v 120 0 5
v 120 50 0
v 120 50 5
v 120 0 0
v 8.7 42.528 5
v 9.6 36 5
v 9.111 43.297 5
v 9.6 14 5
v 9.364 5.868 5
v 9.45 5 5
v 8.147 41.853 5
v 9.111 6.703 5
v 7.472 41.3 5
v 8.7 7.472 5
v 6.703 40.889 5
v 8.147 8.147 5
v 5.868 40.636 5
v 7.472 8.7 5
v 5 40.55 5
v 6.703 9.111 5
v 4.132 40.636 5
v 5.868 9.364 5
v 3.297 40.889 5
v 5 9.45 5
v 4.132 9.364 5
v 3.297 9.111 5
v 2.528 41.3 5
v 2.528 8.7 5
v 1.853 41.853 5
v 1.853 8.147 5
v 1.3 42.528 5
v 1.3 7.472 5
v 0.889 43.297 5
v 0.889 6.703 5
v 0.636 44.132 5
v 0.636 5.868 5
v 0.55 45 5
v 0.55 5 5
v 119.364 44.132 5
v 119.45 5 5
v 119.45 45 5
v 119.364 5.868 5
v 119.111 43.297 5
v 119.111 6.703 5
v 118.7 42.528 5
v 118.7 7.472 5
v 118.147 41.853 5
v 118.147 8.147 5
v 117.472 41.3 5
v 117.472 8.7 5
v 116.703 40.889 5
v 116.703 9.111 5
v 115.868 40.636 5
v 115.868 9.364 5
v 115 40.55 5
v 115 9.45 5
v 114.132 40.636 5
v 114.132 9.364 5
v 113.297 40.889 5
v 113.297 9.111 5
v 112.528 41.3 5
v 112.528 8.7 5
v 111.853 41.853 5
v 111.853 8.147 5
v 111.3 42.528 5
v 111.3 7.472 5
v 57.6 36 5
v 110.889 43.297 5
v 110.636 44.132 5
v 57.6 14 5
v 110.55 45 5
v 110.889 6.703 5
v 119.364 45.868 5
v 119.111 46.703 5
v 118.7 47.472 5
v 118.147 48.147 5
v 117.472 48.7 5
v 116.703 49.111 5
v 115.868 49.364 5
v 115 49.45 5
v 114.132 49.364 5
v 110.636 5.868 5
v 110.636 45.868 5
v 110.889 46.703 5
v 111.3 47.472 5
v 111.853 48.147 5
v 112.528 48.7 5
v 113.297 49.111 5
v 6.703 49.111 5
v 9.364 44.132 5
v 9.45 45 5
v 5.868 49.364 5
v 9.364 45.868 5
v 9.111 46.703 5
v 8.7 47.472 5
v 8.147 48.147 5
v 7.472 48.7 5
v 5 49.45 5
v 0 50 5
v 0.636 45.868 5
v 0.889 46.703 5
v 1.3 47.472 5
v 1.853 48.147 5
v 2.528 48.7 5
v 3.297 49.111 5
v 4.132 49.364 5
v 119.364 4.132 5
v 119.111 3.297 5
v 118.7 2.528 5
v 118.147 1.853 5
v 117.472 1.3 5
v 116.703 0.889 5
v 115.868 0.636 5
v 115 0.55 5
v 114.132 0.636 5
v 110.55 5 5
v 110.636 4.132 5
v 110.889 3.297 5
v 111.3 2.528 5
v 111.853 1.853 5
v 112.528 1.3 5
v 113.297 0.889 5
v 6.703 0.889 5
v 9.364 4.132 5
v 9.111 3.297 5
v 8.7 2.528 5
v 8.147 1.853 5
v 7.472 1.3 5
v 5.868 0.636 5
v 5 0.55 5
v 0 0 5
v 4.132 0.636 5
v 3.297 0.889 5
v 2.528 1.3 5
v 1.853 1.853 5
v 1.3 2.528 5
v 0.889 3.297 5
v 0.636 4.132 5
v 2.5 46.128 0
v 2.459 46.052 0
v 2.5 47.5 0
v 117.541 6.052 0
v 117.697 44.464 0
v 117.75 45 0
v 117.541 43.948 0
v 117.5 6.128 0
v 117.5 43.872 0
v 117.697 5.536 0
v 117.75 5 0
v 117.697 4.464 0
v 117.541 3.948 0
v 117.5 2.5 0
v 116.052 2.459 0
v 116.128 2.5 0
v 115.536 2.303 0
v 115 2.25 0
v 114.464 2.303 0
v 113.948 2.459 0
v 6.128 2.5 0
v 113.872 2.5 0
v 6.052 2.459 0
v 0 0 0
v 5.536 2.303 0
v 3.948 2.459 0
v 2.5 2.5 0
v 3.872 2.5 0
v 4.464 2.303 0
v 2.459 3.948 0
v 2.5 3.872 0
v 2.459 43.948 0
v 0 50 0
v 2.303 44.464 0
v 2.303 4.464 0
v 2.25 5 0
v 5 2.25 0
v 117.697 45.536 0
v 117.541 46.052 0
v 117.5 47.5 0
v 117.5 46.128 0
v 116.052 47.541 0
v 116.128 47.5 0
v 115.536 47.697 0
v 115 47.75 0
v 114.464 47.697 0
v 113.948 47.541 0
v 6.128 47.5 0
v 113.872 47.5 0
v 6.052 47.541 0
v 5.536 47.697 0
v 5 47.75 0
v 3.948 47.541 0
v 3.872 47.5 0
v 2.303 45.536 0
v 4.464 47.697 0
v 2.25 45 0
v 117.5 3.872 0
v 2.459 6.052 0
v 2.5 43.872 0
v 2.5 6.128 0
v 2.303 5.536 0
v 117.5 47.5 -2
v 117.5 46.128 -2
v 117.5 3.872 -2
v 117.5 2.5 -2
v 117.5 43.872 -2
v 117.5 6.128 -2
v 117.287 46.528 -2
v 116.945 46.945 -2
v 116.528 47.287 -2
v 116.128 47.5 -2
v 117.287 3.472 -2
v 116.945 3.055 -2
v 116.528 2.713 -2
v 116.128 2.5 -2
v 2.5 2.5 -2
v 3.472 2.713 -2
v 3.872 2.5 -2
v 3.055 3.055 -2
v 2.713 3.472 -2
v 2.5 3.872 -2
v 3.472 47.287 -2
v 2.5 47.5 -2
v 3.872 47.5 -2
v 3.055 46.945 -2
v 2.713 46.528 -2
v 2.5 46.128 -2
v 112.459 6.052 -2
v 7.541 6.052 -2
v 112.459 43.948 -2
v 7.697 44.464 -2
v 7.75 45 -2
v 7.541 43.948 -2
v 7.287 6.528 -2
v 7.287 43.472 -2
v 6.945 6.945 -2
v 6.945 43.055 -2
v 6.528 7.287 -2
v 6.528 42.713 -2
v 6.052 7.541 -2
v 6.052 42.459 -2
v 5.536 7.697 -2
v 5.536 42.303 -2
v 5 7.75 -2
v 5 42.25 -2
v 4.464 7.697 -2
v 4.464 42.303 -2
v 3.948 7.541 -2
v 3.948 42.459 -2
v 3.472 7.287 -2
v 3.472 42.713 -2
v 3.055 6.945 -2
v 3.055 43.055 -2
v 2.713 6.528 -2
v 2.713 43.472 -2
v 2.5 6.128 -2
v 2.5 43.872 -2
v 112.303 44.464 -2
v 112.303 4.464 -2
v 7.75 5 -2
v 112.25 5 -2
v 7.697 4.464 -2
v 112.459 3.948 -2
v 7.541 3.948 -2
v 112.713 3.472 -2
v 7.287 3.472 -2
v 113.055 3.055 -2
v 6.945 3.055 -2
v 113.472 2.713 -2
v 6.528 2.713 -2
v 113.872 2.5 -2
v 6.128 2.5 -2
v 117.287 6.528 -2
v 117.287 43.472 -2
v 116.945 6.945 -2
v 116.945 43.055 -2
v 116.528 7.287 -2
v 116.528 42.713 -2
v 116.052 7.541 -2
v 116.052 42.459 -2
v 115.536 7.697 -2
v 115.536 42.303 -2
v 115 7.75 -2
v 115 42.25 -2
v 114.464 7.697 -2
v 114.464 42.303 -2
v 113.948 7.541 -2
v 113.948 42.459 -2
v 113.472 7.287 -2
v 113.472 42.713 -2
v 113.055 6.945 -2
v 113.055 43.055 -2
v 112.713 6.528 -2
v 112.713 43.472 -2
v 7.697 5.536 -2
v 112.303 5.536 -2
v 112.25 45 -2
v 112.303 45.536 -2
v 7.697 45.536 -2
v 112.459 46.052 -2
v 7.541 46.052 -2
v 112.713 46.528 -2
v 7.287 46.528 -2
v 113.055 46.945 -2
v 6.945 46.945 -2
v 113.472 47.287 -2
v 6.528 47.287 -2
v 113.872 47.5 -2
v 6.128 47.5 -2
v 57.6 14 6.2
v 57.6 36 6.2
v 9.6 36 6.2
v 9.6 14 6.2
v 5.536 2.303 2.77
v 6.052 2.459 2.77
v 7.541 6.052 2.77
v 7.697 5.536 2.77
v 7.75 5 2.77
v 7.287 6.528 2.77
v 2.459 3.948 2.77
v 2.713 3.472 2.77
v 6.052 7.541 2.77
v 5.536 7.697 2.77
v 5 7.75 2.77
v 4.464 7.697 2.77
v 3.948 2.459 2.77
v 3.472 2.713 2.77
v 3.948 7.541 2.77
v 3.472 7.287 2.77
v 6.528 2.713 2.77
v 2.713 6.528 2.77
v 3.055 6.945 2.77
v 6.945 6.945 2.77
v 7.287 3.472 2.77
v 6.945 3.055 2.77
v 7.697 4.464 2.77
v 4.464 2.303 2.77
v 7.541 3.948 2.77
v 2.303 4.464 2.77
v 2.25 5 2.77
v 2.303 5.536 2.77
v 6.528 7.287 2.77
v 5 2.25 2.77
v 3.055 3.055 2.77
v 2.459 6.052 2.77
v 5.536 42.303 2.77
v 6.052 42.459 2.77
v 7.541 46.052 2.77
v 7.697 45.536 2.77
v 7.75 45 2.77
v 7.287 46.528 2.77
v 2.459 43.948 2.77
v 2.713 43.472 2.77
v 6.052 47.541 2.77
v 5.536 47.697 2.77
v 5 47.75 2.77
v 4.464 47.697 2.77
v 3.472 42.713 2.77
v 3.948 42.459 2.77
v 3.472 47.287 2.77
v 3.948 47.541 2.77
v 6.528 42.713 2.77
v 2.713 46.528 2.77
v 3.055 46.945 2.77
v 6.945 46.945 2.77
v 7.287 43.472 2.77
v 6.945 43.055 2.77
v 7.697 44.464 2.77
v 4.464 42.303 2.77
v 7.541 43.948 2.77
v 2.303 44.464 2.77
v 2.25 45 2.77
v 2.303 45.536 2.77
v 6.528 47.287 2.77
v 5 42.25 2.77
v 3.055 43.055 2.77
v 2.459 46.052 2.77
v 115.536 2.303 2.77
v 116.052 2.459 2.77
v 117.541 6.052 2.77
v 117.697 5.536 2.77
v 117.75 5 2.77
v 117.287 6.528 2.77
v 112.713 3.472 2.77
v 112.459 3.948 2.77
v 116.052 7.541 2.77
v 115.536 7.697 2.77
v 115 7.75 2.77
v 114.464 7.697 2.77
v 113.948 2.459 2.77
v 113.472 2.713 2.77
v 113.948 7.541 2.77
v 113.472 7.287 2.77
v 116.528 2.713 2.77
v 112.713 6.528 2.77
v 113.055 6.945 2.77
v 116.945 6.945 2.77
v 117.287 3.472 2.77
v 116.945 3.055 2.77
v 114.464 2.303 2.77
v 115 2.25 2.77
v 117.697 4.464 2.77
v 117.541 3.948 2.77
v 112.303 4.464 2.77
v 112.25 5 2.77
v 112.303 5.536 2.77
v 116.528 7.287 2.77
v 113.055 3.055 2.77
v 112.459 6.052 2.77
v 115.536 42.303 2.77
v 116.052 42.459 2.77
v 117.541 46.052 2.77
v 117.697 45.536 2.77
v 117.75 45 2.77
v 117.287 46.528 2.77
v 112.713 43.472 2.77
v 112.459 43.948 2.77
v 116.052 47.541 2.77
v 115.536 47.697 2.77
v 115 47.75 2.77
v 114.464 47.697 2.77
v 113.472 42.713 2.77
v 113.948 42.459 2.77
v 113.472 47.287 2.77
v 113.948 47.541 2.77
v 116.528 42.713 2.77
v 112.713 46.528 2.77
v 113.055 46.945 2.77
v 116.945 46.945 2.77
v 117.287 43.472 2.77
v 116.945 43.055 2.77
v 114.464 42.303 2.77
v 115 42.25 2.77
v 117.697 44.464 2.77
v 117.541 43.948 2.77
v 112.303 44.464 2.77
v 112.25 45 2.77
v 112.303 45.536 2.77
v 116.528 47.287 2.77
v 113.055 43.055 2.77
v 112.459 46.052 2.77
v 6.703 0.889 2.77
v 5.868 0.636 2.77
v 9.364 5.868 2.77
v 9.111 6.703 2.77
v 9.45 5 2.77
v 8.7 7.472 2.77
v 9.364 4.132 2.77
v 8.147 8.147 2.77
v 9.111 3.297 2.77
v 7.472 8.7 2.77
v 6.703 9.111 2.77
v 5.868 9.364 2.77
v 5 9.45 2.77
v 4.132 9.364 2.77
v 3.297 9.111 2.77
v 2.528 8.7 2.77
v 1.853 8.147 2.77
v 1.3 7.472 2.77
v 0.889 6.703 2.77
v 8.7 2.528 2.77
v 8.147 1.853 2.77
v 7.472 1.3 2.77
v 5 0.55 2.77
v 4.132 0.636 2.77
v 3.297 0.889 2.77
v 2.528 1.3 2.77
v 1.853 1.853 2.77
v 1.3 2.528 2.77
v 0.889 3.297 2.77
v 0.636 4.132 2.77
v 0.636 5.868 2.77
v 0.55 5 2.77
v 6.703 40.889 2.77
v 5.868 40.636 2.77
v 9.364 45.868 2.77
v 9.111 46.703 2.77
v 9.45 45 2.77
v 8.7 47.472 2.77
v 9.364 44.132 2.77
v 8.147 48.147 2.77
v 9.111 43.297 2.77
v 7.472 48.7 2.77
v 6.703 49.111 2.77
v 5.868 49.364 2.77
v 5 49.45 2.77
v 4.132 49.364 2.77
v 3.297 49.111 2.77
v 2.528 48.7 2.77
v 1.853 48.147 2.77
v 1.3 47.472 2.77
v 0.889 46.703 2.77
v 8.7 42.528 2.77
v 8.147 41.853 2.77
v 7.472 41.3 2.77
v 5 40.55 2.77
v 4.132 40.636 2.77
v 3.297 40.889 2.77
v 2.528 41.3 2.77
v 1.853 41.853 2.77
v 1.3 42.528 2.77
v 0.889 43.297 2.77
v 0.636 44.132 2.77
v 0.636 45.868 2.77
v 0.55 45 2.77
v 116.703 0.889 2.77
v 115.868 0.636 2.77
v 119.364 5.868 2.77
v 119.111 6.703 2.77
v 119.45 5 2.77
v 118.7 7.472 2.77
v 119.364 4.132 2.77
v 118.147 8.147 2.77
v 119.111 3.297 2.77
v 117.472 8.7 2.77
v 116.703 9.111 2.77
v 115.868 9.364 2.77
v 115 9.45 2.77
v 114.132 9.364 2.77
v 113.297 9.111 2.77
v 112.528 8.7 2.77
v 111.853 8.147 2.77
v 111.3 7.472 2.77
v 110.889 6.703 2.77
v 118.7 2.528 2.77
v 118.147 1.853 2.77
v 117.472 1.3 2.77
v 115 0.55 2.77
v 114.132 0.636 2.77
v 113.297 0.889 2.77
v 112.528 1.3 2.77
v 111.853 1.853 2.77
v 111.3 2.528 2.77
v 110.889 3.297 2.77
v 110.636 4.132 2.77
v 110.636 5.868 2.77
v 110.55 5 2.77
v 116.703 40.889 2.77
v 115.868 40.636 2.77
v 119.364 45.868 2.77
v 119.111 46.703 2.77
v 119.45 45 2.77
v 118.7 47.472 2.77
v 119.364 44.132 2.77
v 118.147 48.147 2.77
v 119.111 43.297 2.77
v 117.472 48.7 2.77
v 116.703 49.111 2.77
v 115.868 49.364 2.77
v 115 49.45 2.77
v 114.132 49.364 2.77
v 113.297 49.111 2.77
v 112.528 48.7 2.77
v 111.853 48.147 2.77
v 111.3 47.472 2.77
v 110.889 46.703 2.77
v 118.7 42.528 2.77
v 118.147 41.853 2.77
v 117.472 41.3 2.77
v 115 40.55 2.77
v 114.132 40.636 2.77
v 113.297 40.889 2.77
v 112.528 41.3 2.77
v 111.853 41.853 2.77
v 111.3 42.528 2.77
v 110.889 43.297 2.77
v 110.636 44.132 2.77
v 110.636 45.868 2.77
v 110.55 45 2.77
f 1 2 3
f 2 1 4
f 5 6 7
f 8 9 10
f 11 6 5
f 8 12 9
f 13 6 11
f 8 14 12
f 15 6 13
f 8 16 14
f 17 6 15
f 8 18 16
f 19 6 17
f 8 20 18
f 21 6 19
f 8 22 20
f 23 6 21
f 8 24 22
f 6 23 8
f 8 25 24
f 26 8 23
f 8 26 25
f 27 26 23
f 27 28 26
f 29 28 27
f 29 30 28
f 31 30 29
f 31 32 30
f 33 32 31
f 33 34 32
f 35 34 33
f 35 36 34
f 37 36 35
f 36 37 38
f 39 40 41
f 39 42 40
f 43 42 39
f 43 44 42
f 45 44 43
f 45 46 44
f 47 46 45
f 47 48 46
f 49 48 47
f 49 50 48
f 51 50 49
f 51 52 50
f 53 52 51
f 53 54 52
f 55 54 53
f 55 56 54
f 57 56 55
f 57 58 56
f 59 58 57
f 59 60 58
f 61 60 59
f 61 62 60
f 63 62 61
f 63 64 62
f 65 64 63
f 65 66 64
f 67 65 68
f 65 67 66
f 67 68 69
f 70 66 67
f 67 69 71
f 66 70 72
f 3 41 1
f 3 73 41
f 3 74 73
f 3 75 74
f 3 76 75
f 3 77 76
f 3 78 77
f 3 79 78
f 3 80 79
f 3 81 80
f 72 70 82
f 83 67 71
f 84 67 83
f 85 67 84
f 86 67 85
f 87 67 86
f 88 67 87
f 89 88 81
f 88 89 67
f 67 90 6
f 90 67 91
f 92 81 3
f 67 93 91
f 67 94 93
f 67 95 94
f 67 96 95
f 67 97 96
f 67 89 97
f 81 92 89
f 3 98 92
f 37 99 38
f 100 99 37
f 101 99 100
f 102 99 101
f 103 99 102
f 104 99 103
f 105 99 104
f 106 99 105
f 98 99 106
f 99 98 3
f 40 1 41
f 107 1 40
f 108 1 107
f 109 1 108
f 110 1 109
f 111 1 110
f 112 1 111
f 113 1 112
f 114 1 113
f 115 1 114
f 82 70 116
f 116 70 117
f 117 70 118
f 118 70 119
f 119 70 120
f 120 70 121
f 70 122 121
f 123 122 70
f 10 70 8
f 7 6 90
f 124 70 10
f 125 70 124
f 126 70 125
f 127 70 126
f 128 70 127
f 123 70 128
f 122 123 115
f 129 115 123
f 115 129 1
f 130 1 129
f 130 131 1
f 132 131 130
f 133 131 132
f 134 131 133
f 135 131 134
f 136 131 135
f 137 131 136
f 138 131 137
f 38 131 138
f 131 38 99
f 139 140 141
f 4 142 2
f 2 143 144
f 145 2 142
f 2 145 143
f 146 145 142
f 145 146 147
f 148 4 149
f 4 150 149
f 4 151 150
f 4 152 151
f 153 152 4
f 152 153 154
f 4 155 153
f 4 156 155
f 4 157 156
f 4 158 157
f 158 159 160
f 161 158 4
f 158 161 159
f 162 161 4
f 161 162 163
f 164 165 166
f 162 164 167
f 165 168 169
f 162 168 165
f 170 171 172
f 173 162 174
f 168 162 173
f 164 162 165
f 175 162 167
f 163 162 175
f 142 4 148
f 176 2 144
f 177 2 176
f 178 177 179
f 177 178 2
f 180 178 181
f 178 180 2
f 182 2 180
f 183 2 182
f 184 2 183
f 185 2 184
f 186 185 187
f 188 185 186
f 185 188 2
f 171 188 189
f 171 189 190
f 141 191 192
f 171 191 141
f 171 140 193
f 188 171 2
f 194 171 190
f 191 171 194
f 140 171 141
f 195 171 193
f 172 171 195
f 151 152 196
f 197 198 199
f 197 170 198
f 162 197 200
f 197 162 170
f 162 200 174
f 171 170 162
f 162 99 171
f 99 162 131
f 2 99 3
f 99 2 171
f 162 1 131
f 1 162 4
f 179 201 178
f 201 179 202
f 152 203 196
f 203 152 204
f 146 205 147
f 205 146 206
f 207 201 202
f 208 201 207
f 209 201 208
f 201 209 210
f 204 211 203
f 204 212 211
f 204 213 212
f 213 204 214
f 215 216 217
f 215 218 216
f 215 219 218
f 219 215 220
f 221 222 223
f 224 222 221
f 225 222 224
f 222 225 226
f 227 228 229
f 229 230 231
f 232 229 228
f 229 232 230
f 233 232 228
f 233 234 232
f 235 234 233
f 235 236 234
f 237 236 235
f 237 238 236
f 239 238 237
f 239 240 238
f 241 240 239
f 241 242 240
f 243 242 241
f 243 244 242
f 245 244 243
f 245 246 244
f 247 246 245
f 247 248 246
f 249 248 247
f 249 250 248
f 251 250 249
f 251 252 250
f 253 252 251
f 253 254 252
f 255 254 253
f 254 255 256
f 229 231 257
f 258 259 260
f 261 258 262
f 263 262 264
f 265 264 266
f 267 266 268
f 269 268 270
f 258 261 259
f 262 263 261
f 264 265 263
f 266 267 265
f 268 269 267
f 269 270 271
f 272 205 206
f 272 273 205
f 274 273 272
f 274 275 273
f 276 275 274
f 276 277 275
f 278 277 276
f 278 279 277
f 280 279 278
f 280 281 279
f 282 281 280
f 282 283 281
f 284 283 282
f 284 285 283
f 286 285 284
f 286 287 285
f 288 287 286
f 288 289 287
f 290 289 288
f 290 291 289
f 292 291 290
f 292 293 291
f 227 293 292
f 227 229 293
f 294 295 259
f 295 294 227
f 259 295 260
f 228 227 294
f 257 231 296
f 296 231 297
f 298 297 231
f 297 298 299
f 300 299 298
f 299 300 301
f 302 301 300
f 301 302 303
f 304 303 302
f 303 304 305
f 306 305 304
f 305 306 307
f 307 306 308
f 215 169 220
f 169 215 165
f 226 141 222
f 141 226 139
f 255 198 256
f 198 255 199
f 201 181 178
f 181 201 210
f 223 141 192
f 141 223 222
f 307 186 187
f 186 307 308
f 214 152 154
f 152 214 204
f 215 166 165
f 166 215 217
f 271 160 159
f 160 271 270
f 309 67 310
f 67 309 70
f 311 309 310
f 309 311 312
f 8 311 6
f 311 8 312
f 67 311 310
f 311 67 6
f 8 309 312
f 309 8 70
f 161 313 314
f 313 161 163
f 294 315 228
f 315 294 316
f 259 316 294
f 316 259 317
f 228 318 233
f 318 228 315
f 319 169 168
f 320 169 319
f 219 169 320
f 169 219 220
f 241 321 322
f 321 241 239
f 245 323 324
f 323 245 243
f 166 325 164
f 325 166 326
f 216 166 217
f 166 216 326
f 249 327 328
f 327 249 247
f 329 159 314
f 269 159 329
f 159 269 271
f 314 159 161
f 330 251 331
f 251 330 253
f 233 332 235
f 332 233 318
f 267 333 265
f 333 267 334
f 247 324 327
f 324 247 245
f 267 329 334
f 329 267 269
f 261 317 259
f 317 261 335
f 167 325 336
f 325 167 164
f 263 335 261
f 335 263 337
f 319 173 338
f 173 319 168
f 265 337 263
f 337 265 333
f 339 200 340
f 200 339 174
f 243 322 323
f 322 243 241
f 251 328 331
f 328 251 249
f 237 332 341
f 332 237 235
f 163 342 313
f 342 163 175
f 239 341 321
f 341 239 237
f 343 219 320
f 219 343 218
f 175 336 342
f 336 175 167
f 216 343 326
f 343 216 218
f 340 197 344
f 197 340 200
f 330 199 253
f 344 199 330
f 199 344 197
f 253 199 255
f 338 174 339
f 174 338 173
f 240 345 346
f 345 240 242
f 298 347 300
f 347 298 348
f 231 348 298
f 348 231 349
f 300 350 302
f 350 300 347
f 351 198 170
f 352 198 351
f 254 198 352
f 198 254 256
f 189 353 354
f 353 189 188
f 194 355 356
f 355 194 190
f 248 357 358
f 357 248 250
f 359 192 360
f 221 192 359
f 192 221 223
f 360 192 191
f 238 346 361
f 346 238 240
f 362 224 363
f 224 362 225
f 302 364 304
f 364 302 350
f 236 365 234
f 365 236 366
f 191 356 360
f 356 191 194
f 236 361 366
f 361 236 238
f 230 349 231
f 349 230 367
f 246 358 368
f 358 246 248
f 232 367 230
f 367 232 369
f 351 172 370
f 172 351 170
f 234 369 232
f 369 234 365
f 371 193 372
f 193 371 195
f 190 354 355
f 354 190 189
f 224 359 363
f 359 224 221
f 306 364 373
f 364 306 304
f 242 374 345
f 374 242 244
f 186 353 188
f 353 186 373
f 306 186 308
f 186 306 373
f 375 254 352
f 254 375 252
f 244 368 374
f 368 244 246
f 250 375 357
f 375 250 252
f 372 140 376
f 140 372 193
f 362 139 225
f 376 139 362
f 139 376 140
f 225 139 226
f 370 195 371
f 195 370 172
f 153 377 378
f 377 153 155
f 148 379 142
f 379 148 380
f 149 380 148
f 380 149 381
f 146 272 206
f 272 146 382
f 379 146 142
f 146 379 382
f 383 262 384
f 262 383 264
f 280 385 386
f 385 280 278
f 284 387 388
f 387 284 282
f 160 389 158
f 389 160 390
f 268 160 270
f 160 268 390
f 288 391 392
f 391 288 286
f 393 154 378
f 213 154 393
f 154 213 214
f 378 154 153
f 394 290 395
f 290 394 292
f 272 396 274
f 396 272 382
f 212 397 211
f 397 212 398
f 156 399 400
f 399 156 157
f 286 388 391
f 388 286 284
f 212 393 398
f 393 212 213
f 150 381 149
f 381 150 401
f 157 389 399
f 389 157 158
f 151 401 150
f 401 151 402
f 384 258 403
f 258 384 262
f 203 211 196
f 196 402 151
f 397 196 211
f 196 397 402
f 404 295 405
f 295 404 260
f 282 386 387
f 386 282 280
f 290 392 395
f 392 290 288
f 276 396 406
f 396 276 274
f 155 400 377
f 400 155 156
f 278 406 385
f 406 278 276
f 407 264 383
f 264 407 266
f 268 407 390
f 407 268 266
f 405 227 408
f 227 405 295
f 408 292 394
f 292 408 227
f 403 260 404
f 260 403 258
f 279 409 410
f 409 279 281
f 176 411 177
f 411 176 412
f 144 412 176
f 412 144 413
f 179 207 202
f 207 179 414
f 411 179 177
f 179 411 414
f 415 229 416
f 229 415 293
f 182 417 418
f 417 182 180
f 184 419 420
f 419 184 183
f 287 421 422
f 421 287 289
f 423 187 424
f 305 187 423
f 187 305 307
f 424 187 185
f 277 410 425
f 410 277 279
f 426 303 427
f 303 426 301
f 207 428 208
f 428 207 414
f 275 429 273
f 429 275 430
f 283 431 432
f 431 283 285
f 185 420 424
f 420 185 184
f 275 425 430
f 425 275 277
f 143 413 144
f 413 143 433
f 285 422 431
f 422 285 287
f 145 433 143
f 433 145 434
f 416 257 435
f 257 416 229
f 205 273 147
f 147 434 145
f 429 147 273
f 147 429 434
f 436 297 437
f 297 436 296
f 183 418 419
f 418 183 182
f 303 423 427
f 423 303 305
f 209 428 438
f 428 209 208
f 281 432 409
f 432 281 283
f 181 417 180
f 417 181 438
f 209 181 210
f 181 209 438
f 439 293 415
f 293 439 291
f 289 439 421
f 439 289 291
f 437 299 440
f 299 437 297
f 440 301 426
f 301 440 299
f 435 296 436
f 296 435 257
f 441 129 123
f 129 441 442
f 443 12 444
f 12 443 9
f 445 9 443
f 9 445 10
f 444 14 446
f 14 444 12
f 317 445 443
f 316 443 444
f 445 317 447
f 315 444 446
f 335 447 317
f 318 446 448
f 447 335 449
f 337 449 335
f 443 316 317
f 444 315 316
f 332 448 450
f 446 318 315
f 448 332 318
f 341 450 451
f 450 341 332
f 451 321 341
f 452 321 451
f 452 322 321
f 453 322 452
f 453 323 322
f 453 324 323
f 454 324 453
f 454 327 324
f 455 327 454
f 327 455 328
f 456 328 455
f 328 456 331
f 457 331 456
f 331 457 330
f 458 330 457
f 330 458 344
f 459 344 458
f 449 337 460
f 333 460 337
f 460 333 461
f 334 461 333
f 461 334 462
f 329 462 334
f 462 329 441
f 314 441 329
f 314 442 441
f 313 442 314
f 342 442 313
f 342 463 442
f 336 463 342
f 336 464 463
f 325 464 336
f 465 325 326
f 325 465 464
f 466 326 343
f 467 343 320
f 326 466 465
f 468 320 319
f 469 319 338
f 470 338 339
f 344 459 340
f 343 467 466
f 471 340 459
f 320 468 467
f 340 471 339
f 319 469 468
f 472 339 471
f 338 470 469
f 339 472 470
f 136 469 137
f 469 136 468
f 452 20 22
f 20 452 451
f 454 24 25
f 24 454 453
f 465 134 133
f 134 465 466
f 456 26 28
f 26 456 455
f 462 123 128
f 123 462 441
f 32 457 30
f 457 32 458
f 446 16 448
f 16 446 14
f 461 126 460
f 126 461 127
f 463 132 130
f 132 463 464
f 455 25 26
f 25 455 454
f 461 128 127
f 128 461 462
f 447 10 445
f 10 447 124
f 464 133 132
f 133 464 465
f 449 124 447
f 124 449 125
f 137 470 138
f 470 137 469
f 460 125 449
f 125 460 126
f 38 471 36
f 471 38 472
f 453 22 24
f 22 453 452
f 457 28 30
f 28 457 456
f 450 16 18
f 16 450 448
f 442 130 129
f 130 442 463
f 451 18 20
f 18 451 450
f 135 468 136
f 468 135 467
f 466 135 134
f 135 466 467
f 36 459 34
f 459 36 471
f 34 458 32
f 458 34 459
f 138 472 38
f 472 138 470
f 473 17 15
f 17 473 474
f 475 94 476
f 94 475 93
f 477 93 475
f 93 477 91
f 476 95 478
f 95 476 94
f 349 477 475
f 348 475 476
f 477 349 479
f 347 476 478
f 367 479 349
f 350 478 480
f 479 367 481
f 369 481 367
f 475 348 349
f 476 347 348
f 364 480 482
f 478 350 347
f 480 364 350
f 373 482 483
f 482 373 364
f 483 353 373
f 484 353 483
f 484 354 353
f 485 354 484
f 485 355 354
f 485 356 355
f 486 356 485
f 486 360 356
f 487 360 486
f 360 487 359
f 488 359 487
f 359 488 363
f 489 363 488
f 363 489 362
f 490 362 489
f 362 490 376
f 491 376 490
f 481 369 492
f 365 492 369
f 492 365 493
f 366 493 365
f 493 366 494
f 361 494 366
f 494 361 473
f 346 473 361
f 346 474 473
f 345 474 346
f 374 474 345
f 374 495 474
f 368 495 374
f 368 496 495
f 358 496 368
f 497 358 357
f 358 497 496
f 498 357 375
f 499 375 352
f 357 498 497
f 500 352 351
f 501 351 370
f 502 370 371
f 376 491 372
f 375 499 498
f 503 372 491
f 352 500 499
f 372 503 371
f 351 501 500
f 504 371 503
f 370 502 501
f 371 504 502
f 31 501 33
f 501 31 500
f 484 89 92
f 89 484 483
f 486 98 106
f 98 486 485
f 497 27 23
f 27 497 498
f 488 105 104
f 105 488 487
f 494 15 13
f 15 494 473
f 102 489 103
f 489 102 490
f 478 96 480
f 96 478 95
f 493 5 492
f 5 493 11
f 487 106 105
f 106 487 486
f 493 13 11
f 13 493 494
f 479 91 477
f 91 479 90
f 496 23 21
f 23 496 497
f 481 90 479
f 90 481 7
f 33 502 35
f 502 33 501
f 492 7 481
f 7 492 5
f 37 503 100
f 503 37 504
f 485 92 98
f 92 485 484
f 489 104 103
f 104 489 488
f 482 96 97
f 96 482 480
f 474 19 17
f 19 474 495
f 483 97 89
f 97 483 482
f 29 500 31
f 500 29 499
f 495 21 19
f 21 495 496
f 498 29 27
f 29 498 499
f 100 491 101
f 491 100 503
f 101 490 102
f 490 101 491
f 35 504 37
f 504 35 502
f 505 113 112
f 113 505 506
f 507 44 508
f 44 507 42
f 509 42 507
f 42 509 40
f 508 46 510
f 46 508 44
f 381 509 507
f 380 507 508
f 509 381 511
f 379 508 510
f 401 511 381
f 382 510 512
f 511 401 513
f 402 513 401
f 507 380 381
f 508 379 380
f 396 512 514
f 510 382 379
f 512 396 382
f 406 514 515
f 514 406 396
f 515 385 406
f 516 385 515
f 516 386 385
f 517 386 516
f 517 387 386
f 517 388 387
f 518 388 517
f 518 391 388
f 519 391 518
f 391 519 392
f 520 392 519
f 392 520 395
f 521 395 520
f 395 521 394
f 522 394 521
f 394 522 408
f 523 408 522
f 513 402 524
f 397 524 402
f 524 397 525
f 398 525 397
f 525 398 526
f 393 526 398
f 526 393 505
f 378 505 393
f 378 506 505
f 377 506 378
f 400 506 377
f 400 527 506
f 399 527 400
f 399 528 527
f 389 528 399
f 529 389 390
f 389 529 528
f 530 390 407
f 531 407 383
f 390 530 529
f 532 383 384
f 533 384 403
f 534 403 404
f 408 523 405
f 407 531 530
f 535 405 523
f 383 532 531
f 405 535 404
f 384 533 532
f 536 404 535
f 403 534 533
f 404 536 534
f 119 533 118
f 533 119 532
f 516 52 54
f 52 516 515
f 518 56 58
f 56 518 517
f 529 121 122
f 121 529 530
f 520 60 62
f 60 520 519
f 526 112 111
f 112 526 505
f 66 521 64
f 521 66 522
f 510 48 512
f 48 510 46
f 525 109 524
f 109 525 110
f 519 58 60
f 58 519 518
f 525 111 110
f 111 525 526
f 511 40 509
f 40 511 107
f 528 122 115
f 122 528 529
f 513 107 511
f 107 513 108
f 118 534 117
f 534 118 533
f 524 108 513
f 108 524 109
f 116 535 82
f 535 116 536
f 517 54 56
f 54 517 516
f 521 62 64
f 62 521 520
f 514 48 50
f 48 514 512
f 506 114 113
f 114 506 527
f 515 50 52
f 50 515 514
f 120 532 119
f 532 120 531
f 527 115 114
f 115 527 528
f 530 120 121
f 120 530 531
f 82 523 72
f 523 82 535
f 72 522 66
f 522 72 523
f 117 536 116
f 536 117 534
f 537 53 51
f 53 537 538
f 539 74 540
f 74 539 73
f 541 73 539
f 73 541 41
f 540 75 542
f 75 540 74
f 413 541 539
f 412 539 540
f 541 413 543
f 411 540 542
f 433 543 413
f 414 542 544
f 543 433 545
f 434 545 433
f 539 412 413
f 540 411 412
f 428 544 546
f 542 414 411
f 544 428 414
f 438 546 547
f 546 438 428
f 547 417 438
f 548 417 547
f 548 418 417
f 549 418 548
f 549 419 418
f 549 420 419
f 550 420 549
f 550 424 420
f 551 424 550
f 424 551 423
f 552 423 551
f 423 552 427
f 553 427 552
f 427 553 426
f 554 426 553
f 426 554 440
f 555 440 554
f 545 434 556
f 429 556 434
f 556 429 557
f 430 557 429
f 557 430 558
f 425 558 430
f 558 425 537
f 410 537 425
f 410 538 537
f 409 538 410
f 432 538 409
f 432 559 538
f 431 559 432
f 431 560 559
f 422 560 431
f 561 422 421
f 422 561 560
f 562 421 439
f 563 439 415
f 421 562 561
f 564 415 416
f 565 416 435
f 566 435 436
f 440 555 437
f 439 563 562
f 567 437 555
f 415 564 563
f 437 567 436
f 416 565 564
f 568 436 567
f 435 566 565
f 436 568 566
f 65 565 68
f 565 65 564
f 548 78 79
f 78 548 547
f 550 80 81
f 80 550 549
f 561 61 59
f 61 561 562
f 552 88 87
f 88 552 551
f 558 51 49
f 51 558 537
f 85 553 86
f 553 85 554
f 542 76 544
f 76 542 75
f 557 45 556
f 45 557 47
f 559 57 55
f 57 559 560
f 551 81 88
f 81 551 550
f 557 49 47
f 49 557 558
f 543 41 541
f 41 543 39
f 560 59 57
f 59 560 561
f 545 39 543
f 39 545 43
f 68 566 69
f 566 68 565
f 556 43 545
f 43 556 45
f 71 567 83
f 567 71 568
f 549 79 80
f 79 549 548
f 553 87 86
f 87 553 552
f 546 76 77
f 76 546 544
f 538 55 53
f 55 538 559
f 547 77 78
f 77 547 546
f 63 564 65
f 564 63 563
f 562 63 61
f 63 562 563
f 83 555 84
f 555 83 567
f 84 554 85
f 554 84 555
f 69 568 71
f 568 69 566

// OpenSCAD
$fn = 32;

// ----------------------------------------------------------------------
// Enclosure lid: 120 x 50 x 5 mm, 4 bolt holes
// ----------------------------------------------------------------------

// --- parameters (mm) ---
length = 120;             // lid length, X
width = 50;               // lid width, Y
plate_t = 5;              // lid plate thickness
bolt_d = 5.5;             // bolt clearance
boss_lip = 5;             // bolt hole inset from the corner
sink = 1;                 // overlap of the lip and ribs into the plate
lip_h = 3;                // lip height below the plate
lip_wall = 2.5;           // lip wall thickness
cs_d = 8.9;               // countersink diameter
cs_h = 2.23;              // countersink depth
label_h = 1.2;            // raised marking pad

module plate() {
  cube([length, width, plate_t]);
  /* lip that drops into the housing opening, sunk into the plate */
  translate([lip_wall, lip_wall, -lip_h + sink]) cube([length - 2 * lip_wall, width - 2 * lip_wall, lip_h]);
  /* raised marking pad on top, sunk 1 mm into the plate */
  translate([length * 0.08, width * 0.28, plate_t - 1]) cube([length * 0.4, width * 0.44, label_h + 1]);
}

difference() {
  plate();
  /* bolt pattern matching the corner bosses */
  for (sx = [0, 1]) for (sy = [0, 1])
    translate([sx * (length - 2 * boss_lip) + boss_lip, sy * (width - 2 * boss_lip) + boss_lip, -lip_h - 1])
      cylinder(h = plate_t + lip_h + 2, d = bolt_d);
  /* countersinks so the heads sit flush */
  for (sx = [0, 1]) for (sy = [0, 1])
    translate([sx * (length - 2 * boss_lip) + boss_lip, sy * (width - 2 * boss_lip) + boss_lip, plate_t - cs_h])
      cylinder(h = cs_h + 0.5, d = cs_d);
}
